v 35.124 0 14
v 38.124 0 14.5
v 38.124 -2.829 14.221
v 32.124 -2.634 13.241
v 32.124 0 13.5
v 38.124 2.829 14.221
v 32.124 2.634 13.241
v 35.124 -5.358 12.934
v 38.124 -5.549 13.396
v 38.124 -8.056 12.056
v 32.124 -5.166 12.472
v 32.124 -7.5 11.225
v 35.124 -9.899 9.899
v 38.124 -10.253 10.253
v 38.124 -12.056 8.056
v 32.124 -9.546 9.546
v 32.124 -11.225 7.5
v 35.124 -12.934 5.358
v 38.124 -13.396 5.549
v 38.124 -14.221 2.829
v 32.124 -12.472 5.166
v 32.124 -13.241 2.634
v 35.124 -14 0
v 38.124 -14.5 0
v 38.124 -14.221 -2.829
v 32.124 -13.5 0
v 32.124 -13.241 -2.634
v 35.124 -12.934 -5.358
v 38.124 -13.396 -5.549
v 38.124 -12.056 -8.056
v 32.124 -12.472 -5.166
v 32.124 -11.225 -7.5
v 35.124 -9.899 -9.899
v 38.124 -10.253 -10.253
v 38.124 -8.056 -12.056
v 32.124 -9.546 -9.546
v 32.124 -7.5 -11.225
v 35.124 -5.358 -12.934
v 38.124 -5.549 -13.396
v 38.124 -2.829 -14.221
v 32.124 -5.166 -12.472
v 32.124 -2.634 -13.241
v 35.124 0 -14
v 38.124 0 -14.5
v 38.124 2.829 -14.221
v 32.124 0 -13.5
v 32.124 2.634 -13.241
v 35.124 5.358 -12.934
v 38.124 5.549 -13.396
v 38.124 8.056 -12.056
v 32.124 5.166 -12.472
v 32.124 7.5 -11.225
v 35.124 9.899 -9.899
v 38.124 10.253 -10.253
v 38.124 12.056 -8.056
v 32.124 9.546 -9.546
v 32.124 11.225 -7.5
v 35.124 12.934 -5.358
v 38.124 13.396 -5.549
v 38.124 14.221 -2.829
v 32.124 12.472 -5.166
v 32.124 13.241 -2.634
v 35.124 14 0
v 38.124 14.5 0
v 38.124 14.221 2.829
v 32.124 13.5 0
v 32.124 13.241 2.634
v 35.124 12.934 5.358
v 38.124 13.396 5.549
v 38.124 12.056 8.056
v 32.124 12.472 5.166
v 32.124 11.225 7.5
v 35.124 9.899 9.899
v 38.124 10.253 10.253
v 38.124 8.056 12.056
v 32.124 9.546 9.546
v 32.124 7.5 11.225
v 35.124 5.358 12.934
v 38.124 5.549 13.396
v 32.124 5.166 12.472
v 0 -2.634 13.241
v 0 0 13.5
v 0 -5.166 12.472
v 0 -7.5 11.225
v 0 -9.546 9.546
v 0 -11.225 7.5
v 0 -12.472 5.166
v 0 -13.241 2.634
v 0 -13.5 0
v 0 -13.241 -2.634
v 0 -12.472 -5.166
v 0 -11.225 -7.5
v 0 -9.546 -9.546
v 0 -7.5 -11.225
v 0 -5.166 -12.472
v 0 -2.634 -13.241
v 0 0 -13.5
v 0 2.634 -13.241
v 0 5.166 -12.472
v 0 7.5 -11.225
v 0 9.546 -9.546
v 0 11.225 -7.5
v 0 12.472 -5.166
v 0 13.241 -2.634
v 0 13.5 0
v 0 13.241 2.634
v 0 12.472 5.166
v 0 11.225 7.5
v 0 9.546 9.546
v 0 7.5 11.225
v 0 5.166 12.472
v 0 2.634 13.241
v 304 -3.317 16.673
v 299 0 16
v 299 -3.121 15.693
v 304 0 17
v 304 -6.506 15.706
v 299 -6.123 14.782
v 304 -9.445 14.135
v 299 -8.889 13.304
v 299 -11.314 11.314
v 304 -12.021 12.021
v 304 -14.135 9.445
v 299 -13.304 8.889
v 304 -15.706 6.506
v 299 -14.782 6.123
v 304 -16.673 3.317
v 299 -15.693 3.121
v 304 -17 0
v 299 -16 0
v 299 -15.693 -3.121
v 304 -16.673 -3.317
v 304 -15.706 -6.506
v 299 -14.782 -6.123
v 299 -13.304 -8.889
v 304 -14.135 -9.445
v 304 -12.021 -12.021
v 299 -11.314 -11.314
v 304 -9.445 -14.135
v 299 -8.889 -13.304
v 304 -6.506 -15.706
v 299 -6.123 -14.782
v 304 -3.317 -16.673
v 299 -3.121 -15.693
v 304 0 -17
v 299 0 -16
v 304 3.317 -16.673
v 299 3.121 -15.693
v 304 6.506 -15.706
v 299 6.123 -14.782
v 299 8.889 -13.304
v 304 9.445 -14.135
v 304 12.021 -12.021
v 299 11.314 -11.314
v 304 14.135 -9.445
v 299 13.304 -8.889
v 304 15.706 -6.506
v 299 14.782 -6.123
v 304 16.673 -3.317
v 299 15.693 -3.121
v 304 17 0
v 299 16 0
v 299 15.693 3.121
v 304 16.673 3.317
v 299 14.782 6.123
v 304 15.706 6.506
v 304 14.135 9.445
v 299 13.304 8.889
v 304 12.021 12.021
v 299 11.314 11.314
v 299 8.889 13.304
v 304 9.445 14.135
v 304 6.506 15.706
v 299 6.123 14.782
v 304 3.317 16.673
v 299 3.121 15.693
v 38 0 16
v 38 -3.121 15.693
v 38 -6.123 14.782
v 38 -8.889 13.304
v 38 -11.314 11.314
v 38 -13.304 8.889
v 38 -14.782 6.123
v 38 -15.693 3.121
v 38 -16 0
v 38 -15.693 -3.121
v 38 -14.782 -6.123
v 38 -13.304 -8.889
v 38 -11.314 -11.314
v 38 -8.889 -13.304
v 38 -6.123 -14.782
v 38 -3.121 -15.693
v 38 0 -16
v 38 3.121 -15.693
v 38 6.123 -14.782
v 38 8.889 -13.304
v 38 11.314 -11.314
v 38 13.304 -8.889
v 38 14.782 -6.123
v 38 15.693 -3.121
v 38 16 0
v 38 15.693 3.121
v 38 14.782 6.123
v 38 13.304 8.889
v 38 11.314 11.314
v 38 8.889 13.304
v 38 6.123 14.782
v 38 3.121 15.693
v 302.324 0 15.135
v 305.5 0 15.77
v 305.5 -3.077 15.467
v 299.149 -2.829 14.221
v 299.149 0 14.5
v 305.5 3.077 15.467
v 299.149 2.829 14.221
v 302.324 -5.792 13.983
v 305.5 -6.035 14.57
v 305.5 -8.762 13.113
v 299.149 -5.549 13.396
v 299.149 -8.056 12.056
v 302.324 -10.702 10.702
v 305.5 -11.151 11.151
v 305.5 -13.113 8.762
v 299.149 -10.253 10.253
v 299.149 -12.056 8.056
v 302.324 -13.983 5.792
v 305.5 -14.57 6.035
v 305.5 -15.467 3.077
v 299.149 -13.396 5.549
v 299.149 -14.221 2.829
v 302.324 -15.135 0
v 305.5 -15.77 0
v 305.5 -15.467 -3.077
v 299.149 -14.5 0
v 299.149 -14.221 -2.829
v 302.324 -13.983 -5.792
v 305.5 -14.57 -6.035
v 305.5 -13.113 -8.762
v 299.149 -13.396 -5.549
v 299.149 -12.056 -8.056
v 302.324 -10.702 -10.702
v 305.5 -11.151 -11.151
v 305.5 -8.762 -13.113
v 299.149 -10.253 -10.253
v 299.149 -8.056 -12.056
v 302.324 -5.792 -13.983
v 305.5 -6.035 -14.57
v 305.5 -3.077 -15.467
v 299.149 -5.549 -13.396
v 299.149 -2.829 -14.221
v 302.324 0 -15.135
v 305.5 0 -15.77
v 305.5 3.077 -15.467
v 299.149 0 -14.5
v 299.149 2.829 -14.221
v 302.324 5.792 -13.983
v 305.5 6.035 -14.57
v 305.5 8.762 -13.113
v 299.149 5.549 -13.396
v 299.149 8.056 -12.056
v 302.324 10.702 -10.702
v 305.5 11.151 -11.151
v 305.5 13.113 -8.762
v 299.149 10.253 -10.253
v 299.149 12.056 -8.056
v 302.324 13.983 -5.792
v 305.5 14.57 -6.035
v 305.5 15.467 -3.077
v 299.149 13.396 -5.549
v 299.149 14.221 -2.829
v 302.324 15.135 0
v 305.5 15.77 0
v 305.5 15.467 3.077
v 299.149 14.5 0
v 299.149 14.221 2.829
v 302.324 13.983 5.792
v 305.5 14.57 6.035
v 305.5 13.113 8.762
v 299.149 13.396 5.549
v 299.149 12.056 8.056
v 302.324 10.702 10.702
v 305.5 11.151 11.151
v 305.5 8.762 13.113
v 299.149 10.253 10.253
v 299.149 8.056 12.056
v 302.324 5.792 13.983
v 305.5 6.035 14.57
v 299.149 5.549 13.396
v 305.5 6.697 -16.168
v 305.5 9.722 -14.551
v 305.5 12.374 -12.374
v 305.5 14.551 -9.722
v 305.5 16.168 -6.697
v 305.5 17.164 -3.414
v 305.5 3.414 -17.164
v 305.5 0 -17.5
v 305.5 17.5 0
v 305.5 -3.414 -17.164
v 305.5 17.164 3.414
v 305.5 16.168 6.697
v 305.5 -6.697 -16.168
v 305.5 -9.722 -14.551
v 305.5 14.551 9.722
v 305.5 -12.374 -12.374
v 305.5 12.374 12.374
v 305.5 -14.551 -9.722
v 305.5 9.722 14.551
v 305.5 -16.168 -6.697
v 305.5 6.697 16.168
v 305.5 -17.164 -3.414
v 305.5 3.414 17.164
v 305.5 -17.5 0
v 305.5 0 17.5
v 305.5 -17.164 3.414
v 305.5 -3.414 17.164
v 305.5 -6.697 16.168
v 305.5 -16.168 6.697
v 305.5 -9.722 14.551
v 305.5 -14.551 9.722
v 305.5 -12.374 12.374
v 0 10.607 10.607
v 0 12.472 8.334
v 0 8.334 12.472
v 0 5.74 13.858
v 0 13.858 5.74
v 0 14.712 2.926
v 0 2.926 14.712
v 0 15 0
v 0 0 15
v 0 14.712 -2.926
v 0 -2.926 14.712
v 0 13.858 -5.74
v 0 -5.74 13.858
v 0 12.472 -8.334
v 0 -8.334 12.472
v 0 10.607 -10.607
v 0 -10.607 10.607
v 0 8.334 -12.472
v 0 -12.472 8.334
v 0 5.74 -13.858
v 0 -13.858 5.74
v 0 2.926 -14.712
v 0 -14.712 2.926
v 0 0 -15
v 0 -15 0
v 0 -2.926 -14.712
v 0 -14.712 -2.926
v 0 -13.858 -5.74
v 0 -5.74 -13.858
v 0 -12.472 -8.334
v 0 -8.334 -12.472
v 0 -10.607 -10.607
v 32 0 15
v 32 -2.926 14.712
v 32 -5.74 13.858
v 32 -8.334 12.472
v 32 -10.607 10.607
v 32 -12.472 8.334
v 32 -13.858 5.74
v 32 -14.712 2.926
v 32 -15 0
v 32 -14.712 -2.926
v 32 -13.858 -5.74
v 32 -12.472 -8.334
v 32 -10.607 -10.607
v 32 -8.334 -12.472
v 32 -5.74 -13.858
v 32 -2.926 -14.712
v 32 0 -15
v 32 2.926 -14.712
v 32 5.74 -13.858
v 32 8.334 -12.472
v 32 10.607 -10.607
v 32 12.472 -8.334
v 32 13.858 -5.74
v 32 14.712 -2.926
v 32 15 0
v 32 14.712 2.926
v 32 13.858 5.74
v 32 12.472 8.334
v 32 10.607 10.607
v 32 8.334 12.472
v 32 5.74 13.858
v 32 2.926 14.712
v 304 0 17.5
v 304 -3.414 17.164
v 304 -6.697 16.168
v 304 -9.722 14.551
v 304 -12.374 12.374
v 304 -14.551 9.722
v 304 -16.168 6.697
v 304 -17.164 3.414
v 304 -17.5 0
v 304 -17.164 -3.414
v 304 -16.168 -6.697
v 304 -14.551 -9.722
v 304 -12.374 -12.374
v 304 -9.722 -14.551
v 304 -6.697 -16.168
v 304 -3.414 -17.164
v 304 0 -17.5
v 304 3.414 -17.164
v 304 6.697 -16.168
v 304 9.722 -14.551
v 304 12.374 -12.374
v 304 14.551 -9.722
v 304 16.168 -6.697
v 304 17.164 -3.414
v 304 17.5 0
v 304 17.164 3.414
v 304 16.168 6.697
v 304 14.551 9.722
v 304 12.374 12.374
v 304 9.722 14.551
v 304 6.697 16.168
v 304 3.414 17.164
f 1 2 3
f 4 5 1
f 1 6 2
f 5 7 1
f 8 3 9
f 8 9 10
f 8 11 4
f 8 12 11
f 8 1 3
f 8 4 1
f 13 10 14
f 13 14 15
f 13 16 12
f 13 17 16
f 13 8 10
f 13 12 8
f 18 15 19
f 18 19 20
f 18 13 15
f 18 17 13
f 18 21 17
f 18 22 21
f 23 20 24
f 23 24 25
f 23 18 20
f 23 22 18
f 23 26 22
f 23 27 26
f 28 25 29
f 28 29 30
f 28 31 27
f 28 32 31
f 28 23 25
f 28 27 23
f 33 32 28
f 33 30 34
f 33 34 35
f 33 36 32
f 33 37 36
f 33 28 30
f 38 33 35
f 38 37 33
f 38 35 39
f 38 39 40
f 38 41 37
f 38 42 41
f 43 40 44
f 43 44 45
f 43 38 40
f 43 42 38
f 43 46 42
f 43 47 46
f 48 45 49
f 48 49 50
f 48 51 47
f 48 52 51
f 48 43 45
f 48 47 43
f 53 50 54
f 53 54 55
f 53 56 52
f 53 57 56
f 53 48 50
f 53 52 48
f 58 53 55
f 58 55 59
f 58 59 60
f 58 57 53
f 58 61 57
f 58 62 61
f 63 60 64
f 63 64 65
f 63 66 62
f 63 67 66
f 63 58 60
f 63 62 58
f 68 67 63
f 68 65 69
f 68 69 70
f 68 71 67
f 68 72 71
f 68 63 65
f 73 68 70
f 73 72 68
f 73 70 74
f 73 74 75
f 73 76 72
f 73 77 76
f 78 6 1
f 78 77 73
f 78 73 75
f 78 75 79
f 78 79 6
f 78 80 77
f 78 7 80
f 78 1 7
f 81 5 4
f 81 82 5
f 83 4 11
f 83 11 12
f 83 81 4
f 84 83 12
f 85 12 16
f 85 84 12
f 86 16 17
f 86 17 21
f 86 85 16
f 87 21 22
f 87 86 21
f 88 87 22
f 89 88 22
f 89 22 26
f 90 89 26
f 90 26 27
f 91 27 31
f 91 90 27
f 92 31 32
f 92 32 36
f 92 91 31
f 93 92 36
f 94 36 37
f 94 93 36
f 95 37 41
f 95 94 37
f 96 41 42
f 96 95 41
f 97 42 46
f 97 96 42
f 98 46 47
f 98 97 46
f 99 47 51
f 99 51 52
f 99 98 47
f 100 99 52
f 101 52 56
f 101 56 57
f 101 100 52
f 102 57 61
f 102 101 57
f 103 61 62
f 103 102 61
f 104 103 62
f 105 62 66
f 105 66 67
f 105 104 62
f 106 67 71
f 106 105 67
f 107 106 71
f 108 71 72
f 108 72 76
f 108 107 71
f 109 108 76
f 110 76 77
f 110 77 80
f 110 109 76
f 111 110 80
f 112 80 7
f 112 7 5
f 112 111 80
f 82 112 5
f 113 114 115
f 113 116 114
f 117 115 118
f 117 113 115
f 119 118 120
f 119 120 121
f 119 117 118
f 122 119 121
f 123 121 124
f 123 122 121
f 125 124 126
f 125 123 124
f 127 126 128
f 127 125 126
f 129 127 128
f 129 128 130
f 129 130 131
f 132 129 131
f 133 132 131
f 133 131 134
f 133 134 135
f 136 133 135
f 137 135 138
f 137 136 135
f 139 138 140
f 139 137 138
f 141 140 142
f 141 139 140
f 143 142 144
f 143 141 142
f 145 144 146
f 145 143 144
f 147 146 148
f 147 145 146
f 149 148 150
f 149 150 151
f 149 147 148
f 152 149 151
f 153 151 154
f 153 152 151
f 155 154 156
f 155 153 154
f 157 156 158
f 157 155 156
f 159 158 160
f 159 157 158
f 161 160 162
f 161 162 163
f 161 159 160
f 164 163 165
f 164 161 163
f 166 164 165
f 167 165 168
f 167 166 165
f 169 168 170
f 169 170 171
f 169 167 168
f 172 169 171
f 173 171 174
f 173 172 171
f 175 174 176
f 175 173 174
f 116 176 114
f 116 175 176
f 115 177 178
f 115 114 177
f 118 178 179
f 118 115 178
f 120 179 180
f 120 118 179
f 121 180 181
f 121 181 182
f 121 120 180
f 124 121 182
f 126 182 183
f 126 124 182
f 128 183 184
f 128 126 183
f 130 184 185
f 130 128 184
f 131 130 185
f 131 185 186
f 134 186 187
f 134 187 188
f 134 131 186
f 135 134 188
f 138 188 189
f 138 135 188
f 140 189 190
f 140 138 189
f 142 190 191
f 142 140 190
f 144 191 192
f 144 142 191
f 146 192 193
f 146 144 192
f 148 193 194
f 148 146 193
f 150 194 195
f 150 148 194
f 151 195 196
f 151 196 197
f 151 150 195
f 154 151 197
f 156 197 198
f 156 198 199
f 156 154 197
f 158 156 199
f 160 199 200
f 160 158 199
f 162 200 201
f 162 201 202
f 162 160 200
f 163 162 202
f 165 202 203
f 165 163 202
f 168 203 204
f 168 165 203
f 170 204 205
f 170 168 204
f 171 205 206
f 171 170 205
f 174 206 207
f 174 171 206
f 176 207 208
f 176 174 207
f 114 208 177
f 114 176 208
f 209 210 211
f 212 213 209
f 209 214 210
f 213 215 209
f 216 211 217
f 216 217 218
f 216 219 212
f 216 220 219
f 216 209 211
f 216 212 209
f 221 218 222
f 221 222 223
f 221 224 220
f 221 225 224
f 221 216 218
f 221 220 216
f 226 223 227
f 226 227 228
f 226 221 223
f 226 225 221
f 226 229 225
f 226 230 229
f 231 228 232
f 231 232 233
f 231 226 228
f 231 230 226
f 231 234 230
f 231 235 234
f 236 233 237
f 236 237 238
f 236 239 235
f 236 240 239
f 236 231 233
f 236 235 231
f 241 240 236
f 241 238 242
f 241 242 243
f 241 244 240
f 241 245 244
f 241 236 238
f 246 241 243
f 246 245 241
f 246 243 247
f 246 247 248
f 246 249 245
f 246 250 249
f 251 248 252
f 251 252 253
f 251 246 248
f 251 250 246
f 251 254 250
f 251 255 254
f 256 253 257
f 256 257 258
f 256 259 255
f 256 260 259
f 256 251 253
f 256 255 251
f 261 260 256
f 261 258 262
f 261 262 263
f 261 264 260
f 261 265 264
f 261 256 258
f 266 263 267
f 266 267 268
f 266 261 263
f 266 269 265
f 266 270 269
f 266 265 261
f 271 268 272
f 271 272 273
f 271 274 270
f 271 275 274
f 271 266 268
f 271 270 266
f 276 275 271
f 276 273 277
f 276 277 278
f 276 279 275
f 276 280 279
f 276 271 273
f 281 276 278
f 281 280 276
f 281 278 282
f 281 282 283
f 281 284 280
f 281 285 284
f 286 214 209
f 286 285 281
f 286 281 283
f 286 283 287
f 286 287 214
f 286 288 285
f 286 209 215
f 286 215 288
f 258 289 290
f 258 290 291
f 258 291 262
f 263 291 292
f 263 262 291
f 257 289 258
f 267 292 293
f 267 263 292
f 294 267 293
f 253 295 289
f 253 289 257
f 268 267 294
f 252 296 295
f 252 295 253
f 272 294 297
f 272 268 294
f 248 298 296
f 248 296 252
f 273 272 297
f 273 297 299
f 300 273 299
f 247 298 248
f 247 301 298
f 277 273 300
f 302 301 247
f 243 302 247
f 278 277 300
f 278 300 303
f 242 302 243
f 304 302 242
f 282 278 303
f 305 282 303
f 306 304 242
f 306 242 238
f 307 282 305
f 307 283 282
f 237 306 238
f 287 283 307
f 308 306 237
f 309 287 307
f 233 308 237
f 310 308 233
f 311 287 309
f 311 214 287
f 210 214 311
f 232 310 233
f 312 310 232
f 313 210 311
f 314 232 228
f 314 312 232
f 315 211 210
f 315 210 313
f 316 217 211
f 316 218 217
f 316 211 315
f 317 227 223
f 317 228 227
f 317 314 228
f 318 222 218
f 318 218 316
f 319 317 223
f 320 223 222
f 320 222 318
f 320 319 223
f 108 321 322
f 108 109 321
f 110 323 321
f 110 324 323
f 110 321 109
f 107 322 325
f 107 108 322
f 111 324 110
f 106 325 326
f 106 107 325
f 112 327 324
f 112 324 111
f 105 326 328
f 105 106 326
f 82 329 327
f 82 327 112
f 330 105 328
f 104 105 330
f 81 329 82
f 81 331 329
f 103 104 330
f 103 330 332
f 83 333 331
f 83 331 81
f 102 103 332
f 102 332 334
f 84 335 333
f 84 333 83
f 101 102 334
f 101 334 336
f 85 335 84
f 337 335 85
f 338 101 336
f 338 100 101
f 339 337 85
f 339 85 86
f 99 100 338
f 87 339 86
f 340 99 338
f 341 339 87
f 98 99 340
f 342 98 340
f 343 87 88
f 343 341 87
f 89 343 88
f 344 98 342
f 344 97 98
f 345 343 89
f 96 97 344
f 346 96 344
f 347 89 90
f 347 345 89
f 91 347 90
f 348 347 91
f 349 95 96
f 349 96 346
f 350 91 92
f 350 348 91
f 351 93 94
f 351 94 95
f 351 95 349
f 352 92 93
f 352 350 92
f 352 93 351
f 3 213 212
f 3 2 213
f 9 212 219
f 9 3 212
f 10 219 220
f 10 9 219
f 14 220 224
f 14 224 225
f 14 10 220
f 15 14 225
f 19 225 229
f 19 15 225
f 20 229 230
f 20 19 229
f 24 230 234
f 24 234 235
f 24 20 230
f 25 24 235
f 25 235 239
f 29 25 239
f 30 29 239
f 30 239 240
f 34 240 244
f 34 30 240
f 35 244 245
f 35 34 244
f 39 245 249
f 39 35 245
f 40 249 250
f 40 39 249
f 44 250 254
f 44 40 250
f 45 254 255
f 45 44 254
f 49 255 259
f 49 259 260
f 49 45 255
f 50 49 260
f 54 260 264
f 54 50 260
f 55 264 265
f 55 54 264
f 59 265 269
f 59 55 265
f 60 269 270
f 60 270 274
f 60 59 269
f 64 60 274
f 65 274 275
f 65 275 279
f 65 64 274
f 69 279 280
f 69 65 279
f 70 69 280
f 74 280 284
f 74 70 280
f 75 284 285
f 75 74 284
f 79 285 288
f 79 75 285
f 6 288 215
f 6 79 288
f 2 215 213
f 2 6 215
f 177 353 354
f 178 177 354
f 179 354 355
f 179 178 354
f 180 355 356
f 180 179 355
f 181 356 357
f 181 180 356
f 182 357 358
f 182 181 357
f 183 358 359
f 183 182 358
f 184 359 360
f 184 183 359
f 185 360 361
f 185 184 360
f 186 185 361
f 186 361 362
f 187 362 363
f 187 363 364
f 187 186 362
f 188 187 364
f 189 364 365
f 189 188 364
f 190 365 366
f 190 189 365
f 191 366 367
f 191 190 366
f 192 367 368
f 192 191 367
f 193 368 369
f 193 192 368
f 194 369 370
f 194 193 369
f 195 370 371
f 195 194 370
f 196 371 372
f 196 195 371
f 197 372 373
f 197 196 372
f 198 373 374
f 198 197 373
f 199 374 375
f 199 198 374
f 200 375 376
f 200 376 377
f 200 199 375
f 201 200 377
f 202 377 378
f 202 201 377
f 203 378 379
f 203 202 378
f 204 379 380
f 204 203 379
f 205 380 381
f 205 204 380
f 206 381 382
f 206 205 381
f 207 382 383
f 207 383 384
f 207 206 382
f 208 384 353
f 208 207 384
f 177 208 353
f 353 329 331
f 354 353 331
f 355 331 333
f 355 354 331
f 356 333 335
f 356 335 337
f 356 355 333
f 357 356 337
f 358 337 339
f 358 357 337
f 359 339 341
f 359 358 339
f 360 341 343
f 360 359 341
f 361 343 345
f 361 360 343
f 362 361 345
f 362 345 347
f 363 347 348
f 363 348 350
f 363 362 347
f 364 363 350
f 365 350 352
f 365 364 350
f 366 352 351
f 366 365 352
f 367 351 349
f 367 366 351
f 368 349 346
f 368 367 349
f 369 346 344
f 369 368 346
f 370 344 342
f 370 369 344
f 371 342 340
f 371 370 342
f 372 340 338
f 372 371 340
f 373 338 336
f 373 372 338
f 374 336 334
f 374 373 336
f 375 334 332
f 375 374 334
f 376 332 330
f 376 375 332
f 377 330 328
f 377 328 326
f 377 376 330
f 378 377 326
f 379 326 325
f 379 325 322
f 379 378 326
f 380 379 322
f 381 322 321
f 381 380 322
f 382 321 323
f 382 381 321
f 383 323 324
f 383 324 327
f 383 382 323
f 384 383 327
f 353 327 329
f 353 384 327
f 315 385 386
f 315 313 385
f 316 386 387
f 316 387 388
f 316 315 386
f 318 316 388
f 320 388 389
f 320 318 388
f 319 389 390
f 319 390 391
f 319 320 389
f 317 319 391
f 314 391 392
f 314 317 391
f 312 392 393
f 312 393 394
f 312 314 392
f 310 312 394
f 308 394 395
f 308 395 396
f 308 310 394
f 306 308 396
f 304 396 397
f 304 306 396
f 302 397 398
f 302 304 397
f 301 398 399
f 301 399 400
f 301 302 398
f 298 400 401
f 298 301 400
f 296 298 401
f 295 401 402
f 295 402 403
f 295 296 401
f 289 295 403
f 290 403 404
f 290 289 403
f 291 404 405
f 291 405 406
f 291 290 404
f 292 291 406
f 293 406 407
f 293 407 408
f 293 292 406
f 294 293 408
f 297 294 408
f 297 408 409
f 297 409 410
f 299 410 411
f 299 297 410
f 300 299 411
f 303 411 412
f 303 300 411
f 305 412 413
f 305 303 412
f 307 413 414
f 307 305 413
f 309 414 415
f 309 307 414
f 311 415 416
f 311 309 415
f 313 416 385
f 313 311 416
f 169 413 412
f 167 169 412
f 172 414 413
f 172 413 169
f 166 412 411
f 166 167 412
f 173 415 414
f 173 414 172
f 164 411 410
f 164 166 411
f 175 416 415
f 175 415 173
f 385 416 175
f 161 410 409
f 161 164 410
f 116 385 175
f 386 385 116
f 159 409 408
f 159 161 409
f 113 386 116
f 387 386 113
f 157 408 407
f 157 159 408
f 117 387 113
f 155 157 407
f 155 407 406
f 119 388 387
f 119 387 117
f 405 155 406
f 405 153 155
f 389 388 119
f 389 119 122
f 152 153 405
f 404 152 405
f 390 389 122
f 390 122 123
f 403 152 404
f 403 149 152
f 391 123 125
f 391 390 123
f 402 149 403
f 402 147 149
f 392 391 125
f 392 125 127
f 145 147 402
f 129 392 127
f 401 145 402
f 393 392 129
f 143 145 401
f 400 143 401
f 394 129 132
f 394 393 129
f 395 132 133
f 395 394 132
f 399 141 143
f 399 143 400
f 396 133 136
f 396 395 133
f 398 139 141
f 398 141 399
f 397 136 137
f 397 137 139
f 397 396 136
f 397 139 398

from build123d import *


with BuildPart() as part:
    # Esquisse1 → Base-Révolution (revolve)
    with BuildSketch(Plane.XY, mode=Mode.PRIVATE) as base_r_volution_sk:
        Polygon((0, 15), (32, 15), (38, 16), (299, 16), (304, 17), (304, 17.5), (305.5, 17.5), (305.5, 15.770294146), (299.14852927, 14.5), (38.124143795, 14.5), (32.124143795, 13.5), (0, 13.5), align=None)
    revolve(base_r_volution_sk.sketch.rotate(Axis((0, 0, 0), (1, 0, 0)), 90), axis=Axis((0, 0, 0), (1, 0, 0)))


solid = part.part
